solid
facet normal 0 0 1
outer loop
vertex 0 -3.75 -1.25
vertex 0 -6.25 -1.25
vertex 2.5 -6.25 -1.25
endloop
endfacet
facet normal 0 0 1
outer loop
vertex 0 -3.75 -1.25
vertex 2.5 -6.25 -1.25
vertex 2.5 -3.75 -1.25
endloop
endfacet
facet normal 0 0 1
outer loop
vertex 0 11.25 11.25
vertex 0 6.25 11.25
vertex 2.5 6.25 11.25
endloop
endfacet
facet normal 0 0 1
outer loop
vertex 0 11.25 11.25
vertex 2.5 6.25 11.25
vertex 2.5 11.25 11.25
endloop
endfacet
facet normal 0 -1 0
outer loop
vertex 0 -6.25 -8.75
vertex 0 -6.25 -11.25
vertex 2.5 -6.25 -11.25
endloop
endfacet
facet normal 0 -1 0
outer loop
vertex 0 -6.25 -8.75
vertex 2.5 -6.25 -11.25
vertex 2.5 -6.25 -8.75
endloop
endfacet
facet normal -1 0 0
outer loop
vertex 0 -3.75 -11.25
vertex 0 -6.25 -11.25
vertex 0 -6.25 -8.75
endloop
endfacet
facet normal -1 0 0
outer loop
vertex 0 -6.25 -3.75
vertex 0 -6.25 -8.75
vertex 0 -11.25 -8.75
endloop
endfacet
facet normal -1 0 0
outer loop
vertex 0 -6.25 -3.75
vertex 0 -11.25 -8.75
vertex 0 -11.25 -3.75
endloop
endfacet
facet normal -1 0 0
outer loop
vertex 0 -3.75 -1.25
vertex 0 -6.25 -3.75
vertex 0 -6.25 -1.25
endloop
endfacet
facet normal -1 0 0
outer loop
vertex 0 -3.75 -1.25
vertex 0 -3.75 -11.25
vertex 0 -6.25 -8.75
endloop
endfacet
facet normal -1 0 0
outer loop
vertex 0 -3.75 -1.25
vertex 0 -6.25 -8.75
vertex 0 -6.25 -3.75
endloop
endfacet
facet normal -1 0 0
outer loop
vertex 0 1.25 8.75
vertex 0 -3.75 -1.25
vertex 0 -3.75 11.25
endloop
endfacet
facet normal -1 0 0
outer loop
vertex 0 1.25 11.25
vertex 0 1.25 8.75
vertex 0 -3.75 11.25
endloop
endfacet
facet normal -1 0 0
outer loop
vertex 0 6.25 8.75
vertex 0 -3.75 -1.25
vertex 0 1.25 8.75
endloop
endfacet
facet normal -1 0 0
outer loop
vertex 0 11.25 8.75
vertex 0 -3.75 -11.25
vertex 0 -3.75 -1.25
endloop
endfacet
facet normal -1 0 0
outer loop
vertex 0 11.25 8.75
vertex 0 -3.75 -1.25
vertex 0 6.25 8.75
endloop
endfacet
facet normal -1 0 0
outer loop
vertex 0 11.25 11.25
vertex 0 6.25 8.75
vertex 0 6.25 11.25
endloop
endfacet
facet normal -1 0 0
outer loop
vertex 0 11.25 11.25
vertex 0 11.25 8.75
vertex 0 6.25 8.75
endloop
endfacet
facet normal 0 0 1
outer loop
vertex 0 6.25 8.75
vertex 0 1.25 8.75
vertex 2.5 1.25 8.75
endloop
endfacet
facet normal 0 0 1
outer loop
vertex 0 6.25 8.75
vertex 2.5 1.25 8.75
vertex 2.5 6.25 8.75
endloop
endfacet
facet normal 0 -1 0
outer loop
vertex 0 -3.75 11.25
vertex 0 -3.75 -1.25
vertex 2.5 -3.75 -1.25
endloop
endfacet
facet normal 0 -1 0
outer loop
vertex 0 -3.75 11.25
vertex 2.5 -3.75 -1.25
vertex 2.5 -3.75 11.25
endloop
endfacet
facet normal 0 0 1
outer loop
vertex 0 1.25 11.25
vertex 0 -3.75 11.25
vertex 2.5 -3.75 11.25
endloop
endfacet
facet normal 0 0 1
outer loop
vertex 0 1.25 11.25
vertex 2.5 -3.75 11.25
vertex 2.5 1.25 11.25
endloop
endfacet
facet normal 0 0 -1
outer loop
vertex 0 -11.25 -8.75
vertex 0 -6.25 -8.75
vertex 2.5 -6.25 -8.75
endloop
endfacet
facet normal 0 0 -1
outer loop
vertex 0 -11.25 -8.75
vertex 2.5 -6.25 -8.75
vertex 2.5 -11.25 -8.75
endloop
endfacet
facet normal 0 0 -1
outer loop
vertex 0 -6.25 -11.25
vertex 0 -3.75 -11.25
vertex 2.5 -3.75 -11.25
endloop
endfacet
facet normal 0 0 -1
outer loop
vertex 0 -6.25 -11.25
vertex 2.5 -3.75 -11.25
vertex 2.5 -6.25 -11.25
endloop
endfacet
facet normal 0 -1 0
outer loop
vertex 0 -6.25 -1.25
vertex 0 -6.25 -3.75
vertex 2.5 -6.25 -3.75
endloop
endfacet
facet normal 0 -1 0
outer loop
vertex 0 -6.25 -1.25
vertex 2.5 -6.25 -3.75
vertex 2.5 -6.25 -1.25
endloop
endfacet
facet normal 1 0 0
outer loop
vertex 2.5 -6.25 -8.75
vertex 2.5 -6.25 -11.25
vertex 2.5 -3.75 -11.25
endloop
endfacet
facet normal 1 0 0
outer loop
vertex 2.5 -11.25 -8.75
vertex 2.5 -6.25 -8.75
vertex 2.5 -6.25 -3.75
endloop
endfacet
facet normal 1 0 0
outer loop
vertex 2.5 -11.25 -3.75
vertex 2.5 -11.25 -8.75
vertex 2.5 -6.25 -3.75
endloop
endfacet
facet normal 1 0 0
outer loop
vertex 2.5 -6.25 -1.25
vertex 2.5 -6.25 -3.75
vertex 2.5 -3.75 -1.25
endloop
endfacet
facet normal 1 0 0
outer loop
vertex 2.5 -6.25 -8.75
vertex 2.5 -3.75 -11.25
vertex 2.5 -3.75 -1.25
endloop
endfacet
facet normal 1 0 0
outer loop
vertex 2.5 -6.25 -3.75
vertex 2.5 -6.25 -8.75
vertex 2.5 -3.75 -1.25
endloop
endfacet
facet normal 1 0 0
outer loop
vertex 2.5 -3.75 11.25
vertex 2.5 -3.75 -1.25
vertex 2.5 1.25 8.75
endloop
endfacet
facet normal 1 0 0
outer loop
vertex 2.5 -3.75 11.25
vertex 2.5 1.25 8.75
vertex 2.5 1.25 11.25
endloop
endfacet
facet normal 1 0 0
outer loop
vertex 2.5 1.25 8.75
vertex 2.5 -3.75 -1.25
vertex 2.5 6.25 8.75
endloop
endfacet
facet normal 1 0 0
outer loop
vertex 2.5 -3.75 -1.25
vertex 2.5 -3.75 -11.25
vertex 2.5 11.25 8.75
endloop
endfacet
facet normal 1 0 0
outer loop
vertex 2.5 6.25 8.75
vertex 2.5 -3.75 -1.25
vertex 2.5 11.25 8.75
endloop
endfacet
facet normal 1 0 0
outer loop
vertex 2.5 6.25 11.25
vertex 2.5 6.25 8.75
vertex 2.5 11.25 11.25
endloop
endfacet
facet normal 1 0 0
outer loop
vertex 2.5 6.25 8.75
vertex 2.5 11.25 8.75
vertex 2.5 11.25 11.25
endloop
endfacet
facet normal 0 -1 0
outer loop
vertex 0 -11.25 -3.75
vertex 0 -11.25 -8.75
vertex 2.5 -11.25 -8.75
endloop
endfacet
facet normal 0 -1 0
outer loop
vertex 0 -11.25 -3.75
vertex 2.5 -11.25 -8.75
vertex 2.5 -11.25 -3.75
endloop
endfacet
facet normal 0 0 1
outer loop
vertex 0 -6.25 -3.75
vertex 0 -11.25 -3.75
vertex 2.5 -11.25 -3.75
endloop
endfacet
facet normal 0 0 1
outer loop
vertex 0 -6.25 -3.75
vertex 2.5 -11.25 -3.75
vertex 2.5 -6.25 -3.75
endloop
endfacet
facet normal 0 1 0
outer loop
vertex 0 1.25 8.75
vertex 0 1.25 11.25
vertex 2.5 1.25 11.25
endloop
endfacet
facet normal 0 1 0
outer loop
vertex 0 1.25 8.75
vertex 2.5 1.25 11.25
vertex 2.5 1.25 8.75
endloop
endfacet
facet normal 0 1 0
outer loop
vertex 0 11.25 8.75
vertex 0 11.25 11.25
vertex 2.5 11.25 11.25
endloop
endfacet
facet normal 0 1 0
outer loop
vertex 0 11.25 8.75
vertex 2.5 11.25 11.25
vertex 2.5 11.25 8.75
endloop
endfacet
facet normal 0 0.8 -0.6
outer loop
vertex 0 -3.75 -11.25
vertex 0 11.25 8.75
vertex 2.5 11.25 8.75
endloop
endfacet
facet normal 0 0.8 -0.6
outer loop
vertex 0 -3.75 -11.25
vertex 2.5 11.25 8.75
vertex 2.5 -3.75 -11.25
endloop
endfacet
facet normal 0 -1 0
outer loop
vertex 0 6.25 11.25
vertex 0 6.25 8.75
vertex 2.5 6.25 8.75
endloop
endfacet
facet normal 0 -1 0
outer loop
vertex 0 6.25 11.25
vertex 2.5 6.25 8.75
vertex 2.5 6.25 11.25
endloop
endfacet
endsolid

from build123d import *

# Parameters (mm, degrees)
BOSS_EXTRUDE1_DEPTH = 2.5


with BuildPart() as part:
    # Sketch2 → Boss-Extrude1 (new body)
    with BuildSketch(Plane(origin=(0, 0, 0), x_dir=(0, 0, -1), z_dir=(1, 0, 0))):
        Polygon((-8.75, 11.25), (11.25, -3.75), (11.25, -6.25), (8.75, -6.25), (8.75, -11.25), (3.75, -11.25), (3.75, -6.25), (1.25, -6.25), (1.25, -3.75), (-11.25, -3.75), (-11.25, 1.25), (-8.75, 1.25), (-8.75, 6.25), (-11.25, 6.25), (-11.25, 11.25), align=None)
    extrude(amount=BOSS_EXTRUDE1_DEPTH)


solid = part.part
